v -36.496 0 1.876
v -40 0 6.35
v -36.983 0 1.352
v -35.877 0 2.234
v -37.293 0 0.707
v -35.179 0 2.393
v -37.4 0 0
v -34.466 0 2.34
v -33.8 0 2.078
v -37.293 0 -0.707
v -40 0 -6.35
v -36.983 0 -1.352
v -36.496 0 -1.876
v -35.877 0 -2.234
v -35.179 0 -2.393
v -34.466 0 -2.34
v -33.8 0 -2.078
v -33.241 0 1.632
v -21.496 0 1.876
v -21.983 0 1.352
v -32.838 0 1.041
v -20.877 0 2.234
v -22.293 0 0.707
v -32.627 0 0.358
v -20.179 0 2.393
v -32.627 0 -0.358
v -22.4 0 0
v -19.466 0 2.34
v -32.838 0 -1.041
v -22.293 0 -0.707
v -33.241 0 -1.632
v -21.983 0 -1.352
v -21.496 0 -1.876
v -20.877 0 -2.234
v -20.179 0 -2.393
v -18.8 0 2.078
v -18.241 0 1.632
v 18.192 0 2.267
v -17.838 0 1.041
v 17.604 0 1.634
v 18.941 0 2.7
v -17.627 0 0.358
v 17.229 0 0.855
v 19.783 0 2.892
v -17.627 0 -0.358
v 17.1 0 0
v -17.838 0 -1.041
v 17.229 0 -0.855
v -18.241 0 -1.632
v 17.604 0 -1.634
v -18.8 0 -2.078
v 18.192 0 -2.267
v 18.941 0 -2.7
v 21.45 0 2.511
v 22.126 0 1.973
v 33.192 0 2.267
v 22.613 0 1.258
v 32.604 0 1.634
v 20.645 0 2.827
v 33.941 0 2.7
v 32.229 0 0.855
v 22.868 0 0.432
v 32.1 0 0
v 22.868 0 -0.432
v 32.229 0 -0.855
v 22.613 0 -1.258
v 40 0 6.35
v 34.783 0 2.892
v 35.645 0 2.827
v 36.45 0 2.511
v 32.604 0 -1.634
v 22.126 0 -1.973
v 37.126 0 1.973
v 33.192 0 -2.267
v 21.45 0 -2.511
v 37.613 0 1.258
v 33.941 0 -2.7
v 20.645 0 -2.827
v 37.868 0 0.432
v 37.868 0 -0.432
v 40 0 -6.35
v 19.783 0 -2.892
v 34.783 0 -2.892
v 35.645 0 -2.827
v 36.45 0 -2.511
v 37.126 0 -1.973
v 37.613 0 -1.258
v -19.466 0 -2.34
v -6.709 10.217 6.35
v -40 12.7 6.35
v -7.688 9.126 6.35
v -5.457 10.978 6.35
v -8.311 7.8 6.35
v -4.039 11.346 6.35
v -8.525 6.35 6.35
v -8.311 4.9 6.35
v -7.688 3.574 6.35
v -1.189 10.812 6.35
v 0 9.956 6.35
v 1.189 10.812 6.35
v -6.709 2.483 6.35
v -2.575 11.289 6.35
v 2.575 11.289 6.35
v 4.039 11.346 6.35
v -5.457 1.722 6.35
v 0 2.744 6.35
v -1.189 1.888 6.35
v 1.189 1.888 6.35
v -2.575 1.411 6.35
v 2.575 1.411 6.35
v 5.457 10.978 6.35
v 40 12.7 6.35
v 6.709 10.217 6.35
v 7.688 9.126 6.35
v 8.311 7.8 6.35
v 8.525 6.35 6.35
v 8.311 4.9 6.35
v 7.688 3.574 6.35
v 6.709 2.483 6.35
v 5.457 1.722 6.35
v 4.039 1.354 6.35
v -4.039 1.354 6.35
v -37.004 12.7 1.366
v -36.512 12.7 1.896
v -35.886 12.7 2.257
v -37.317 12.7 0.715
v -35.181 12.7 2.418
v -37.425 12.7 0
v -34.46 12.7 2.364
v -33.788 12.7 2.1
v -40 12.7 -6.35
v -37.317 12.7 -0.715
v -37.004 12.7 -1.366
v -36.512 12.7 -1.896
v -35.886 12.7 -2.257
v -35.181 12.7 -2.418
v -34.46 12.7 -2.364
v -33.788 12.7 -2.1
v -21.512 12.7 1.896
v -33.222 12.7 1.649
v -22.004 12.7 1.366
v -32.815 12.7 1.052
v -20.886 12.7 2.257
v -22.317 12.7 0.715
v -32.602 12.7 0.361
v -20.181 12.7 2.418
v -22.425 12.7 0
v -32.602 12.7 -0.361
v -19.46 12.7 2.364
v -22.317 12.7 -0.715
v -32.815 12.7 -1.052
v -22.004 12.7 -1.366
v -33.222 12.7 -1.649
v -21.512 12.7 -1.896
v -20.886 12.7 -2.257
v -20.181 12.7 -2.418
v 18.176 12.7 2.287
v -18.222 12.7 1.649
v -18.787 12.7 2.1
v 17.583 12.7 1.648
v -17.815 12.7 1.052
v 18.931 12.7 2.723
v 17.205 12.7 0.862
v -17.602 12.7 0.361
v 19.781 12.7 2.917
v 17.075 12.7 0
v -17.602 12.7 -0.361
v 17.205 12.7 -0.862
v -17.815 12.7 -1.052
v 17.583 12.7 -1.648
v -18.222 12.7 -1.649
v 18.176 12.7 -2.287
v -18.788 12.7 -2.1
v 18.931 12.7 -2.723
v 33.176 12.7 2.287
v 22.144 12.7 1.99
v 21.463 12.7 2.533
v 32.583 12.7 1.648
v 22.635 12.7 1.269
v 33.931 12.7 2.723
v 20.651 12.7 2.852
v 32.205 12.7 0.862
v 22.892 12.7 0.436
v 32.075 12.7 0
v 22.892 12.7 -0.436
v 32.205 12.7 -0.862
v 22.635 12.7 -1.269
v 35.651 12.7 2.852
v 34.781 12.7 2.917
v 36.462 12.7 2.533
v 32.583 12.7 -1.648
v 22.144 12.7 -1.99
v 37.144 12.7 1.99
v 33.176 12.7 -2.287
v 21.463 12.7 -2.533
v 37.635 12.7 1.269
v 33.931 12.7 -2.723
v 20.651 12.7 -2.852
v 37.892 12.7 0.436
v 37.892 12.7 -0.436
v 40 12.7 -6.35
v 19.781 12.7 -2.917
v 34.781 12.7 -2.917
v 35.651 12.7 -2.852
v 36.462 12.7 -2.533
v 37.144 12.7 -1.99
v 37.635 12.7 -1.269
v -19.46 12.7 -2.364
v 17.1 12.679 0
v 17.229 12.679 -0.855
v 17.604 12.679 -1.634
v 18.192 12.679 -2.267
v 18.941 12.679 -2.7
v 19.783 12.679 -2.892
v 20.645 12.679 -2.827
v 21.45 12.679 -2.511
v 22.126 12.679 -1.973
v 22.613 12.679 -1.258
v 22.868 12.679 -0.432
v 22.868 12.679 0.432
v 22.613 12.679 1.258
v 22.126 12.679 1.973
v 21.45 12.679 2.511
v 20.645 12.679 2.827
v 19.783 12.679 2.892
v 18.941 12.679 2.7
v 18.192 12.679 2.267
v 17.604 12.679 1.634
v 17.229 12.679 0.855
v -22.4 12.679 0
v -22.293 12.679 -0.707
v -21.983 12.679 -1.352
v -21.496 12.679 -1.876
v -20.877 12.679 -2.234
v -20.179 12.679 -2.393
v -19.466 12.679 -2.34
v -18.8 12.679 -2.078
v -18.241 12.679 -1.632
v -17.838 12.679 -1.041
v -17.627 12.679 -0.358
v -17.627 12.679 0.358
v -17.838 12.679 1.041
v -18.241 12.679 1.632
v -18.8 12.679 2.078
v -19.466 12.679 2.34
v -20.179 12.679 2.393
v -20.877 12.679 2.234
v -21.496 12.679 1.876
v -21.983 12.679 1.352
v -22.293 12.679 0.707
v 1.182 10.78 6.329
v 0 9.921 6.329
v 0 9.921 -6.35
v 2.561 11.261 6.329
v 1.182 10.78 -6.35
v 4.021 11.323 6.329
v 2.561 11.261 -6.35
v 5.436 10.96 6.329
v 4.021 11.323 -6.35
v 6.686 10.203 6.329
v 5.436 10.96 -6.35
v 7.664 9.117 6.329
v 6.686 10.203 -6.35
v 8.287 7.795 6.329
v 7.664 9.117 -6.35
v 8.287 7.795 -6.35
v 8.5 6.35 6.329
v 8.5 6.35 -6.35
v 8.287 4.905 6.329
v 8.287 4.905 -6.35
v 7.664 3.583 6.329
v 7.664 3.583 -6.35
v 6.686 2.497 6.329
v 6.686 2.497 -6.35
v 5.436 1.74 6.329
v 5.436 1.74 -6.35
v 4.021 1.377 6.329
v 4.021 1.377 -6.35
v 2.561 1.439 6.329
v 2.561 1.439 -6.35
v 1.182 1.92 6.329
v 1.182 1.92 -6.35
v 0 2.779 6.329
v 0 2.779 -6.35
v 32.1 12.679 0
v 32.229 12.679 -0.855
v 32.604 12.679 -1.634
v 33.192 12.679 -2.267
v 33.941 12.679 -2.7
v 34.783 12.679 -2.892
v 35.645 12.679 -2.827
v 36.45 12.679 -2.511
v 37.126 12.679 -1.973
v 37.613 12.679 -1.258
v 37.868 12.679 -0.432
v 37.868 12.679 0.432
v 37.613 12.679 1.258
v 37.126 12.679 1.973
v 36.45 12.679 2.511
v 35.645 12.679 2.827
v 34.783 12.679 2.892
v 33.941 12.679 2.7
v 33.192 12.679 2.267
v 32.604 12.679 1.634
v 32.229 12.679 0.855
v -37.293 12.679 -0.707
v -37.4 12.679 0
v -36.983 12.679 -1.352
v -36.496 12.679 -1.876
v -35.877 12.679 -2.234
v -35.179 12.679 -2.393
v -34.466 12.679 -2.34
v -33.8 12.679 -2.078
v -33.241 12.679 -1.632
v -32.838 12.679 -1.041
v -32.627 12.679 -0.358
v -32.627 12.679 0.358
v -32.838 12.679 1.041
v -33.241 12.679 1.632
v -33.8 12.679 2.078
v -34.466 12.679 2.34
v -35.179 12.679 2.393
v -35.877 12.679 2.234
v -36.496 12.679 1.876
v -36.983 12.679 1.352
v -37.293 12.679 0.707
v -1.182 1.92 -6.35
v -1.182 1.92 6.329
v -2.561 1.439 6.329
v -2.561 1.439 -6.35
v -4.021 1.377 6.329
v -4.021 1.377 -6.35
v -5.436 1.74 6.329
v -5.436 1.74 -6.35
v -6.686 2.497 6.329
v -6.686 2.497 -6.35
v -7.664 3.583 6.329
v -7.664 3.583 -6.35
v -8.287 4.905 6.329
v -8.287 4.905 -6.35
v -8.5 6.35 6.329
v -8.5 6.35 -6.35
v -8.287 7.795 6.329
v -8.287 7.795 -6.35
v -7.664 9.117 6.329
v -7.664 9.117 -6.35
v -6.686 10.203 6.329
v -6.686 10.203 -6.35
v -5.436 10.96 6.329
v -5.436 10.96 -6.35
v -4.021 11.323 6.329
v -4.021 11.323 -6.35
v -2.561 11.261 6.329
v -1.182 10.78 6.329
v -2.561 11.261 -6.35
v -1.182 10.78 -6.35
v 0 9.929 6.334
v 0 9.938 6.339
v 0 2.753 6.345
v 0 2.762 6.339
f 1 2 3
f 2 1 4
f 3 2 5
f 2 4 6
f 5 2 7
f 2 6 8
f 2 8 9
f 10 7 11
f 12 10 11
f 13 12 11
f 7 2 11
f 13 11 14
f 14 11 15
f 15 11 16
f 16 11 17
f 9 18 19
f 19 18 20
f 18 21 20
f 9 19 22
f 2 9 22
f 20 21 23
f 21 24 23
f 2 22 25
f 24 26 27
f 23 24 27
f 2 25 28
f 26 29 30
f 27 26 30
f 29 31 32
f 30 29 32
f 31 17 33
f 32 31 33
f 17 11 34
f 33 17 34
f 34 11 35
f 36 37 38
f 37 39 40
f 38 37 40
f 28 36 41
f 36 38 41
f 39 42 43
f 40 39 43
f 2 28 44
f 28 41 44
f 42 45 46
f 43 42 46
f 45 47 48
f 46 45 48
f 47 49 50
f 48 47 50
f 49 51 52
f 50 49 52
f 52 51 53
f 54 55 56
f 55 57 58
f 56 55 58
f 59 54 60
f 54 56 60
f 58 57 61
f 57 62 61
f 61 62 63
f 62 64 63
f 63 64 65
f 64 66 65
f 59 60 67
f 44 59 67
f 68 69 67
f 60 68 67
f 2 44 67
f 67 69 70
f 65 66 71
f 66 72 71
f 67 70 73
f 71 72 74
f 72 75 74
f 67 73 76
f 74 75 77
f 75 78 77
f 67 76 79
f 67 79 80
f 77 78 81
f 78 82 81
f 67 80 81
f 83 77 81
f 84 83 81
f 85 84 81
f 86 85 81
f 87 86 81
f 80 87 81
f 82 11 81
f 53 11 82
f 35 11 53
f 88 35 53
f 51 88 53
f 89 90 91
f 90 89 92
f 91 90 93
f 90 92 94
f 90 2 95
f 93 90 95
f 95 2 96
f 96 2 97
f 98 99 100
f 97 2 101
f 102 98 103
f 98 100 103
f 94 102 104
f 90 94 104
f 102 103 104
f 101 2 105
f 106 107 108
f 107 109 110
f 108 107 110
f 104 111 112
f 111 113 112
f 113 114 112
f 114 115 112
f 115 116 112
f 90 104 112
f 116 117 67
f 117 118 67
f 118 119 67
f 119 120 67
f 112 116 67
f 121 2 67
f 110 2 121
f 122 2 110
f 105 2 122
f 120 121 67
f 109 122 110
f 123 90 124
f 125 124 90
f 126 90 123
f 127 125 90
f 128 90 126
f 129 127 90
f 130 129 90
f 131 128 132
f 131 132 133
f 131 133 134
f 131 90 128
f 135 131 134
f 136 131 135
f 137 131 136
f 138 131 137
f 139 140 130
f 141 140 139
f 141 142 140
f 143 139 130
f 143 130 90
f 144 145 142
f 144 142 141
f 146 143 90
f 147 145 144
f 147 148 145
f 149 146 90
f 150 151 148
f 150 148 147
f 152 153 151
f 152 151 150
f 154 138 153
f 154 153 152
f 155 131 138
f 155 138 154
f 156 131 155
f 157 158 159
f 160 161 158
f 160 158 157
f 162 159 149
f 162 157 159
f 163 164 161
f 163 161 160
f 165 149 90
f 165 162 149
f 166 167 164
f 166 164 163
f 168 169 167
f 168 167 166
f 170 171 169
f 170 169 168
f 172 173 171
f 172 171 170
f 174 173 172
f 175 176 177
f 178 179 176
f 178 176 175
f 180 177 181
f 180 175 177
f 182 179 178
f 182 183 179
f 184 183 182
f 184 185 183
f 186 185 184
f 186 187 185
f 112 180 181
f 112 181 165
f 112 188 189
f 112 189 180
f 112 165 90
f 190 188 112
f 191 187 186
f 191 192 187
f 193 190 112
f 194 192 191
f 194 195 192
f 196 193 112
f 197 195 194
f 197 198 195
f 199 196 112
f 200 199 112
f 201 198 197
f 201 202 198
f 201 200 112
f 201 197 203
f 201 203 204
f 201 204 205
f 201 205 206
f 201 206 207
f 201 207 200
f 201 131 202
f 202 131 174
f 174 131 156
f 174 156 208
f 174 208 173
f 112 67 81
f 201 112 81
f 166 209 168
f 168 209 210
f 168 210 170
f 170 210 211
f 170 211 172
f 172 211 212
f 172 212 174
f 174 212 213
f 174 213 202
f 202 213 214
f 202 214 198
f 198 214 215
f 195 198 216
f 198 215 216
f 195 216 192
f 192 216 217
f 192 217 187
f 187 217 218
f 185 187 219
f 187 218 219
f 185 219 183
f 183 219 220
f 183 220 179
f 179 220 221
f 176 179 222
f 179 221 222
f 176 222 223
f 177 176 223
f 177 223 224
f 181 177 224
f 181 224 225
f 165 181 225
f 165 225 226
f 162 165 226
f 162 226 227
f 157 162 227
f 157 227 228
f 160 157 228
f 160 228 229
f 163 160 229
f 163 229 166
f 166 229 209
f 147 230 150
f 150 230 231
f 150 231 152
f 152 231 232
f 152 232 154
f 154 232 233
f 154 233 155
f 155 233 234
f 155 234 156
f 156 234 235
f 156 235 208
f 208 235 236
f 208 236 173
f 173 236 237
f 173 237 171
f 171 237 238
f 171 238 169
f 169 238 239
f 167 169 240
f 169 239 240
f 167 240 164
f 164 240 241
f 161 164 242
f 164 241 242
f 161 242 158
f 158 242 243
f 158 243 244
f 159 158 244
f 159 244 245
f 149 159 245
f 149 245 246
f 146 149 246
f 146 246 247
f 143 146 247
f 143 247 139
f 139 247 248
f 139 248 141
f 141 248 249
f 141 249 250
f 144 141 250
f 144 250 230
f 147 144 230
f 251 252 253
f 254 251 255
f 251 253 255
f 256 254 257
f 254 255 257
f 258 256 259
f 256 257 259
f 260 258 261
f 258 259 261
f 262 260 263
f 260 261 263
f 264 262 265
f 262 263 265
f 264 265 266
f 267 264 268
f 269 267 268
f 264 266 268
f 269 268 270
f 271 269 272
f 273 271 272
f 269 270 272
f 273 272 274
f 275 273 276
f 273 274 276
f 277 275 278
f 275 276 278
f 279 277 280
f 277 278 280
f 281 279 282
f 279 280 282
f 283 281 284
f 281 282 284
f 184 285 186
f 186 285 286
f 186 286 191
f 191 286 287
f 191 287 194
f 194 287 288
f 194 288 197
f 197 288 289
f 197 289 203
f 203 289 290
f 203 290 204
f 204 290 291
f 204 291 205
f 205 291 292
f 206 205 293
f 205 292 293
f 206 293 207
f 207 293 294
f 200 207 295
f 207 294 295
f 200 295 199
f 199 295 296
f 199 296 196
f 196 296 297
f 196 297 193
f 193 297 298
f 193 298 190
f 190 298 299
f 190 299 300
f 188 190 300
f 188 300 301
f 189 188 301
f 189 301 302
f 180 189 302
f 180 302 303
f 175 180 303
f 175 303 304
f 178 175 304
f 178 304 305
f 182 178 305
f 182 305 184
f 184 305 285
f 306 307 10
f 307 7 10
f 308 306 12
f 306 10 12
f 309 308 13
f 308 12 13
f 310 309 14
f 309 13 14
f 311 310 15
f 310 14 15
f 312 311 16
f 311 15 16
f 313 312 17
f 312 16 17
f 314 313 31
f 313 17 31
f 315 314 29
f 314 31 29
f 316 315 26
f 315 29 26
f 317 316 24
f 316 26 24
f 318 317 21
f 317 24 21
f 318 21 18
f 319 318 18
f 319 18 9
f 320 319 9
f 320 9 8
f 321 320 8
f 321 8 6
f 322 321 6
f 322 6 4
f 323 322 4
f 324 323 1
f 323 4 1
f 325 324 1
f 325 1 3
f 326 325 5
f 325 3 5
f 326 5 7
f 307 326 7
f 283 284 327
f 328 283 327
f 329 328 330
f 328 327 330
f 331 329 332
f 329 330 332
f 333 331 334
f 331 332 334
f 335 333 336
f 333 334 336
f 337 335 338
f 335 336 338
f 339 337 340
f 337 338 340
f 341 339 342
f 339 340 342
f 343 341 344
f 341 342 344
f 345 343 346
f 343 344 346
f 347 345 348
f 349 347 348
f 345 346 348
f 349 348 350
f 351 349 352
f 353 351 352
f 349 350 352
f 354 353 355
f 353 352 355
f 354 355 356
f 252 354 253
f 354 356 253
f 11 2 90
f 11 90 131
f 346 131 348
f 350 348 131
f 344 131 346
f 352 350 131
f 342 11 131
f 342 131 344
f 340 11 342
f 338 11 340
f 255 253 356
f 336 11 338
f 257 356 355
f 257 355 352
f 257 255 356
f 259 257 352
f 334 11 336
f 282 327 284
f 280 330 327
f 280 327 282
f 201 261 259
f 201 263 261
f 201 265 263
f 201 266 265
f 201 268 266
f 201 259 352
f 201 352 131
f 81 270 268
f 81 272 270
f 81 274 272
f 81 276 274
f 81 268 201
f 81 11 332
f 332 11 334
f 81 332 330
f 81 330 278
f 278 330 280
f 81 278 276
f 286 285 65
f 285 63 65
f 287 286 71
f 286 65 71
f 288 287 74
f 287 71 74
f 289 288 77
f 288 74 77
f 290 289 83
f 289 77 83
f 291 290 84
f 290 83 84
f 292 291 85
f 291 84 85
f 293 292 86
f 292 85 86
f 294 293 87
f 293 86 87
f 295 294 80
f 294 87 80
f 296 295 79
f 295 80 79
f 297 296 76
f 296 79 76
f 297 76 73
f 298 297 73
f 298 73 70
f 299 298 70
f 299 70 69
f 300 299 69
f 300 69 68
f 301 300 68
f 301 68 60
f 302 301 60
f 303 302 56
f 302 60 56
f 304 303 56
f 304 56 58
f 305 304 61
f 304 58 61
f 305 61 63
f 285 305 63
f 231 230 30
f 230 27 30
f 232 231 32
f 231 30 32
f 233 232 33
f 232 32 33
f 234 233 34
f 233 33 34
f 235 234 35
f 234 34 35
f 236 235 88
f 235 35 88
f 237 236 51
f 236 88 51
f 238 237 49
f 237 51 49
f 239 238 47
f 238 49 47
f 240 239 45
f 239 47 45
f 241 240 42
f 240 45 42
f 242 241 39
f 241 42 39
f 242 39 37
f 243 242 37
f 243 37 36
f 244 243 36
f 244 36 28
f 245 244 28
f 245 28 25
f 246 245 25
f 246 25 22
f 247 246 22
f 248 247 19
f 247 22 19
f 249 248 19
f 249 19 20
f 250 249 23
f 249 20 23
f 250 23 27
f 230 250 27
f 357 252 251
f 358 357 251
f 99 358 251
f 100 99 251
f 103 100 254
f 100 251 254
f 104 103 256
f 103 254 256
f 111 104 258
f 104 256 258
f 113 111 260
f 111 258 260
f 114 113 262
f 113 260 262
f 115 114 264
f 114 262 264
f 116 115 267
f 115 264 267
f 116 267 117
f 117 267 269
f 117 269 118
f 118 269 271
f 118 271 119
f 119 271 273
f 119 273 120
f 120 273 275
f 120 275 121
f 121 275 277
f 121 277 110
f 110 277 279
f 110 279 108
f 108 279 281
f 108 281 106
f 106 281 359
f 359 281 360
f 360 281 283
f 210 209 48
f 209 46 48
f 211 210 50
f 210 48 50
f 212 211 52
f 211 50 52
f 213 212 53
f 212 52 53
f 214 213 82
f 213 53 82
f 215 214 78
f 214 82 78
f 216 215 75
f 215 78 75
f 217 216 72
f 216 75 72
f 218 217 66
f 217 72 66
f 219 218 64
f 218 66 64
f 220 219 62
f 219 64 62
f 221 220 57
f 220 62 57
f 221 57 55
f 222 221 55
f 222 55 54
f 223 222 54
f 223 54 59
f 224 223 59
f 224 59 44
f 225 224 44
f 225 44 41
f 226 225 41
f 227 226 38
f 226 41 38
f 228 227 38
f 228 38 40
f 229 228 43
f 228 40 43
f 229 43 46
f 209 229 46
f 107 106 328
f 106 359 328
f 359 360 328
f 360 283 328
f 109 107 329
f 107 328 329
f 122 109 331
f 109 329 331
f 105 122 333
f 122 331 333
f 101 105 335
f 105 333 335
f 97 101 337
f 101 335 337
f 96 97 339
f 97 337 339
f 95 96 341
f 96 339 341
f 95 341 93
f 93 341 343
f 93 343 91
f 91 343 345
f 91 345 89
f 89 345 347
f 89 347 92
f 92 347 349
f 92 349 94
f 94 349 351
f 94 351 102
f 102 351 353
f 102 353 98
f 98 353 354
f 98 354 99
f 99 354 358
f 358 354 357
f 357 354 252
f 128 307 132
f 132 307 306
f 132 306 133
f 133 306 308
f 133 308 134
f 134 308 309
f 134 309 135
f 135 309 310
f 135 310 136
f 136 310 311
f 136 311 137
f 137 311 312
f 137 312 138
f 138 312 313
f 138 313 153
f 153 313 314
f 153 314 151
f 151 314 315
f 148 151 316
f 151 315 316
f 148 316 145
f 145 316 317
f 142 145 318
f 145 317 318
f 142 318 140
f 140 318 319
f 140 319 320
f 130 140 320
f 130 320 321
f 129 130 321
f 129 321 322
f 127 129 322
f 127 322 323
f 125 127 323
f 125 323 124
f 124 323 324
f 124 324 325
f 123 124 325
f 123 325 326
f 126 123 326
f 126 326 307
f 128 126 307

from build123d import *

# Parameters (mm, degrees)
SKETCH1_W                      = 80
SKETCH1_H                      = 12.7
BOSS_EXTRUDE1_DEPTH            = 12.7
M4_CLEARANCE_HOLE1_D           = 4.8
M4_CLEARANCE_HOLE1_CSINK_D     = 4.85
M4_CLEARANCE_HOLE1_CSINK_ANGLE = 100
M8_CLEARANCE_HOLE1_D           = 10
M8_CLEARANCE_HOLE1_CSINK_D     = 10.05
M8_CLEARANCE_HOLE1_CSINK_ANGLE = 100
M5_CLEARANCE_HOLE1_D           = 5.8
M5_CLEARANCE_HOLE1_CSINK_D     = 5.85
M5_CLEARANCE_HOLE1_CSINK_ANGLE = 100


with BuildPart() as part:
    # Sketch1 → Boss-Extrude1 (new body)
    with BuildSketch(Plane(origin=(0, 0, 0), x_dir=(1, 0, 0), z_dir=(0, 1, 0))):
        Rectangle(SKETCH1_W, SKETCH1_H)
    extrude(amount=BOSS_EXTRUDE1_DEPTH)

    # M4 Clearance Hole1 (through all)
    with Locations(Plane(origin=(0, 12.7, 0), x_dir=(1, 0, 0), z_dir=(0, 1, 0))):
        with Locations((-35, 0), (-20, 0)):
            CounterSinkHole(M4_CLEARANCE_HOLE1_D / 2, M4_CLEARANCE_HOLE1_CSINK_D / 2, counter_sink_angle=M4_CLEARANCE_HOLE1_CSINK_ANGLE)

    # M8 Clearance Hole1 (through all)
    with Locations(Plane.XY.offset(6.35)):
        with Locations((-3.5, 6.35), (3.5, 6.35)):
            CounterSinkHole(M8_CLEARANCE_HOLE1_D / 2, M8_CLEARANCE_HOLE1_CSINK_D / 2, counter_sink_angle=M8_CLEARANCE_HOLE1_CSINK_ANGLE)

    # M5 Clearance Hole1 (through all)
    with Locations(Plane(origin=(0, 12.7, 0), x_dir=(1, 0, 0), z_dir=(0, 1, 0))):
        with Locations((35, 0), (20, 0)):
            CounterSinkHole(M5_CLEARANCE_HOLE1_D / 2, M5_CLEARANCE_HOLE1_CSINK_D / 2, counter_sink_angle=M5_CLEARANCE_HOLE1_CSINK_ANGLE)


solid = part.part
